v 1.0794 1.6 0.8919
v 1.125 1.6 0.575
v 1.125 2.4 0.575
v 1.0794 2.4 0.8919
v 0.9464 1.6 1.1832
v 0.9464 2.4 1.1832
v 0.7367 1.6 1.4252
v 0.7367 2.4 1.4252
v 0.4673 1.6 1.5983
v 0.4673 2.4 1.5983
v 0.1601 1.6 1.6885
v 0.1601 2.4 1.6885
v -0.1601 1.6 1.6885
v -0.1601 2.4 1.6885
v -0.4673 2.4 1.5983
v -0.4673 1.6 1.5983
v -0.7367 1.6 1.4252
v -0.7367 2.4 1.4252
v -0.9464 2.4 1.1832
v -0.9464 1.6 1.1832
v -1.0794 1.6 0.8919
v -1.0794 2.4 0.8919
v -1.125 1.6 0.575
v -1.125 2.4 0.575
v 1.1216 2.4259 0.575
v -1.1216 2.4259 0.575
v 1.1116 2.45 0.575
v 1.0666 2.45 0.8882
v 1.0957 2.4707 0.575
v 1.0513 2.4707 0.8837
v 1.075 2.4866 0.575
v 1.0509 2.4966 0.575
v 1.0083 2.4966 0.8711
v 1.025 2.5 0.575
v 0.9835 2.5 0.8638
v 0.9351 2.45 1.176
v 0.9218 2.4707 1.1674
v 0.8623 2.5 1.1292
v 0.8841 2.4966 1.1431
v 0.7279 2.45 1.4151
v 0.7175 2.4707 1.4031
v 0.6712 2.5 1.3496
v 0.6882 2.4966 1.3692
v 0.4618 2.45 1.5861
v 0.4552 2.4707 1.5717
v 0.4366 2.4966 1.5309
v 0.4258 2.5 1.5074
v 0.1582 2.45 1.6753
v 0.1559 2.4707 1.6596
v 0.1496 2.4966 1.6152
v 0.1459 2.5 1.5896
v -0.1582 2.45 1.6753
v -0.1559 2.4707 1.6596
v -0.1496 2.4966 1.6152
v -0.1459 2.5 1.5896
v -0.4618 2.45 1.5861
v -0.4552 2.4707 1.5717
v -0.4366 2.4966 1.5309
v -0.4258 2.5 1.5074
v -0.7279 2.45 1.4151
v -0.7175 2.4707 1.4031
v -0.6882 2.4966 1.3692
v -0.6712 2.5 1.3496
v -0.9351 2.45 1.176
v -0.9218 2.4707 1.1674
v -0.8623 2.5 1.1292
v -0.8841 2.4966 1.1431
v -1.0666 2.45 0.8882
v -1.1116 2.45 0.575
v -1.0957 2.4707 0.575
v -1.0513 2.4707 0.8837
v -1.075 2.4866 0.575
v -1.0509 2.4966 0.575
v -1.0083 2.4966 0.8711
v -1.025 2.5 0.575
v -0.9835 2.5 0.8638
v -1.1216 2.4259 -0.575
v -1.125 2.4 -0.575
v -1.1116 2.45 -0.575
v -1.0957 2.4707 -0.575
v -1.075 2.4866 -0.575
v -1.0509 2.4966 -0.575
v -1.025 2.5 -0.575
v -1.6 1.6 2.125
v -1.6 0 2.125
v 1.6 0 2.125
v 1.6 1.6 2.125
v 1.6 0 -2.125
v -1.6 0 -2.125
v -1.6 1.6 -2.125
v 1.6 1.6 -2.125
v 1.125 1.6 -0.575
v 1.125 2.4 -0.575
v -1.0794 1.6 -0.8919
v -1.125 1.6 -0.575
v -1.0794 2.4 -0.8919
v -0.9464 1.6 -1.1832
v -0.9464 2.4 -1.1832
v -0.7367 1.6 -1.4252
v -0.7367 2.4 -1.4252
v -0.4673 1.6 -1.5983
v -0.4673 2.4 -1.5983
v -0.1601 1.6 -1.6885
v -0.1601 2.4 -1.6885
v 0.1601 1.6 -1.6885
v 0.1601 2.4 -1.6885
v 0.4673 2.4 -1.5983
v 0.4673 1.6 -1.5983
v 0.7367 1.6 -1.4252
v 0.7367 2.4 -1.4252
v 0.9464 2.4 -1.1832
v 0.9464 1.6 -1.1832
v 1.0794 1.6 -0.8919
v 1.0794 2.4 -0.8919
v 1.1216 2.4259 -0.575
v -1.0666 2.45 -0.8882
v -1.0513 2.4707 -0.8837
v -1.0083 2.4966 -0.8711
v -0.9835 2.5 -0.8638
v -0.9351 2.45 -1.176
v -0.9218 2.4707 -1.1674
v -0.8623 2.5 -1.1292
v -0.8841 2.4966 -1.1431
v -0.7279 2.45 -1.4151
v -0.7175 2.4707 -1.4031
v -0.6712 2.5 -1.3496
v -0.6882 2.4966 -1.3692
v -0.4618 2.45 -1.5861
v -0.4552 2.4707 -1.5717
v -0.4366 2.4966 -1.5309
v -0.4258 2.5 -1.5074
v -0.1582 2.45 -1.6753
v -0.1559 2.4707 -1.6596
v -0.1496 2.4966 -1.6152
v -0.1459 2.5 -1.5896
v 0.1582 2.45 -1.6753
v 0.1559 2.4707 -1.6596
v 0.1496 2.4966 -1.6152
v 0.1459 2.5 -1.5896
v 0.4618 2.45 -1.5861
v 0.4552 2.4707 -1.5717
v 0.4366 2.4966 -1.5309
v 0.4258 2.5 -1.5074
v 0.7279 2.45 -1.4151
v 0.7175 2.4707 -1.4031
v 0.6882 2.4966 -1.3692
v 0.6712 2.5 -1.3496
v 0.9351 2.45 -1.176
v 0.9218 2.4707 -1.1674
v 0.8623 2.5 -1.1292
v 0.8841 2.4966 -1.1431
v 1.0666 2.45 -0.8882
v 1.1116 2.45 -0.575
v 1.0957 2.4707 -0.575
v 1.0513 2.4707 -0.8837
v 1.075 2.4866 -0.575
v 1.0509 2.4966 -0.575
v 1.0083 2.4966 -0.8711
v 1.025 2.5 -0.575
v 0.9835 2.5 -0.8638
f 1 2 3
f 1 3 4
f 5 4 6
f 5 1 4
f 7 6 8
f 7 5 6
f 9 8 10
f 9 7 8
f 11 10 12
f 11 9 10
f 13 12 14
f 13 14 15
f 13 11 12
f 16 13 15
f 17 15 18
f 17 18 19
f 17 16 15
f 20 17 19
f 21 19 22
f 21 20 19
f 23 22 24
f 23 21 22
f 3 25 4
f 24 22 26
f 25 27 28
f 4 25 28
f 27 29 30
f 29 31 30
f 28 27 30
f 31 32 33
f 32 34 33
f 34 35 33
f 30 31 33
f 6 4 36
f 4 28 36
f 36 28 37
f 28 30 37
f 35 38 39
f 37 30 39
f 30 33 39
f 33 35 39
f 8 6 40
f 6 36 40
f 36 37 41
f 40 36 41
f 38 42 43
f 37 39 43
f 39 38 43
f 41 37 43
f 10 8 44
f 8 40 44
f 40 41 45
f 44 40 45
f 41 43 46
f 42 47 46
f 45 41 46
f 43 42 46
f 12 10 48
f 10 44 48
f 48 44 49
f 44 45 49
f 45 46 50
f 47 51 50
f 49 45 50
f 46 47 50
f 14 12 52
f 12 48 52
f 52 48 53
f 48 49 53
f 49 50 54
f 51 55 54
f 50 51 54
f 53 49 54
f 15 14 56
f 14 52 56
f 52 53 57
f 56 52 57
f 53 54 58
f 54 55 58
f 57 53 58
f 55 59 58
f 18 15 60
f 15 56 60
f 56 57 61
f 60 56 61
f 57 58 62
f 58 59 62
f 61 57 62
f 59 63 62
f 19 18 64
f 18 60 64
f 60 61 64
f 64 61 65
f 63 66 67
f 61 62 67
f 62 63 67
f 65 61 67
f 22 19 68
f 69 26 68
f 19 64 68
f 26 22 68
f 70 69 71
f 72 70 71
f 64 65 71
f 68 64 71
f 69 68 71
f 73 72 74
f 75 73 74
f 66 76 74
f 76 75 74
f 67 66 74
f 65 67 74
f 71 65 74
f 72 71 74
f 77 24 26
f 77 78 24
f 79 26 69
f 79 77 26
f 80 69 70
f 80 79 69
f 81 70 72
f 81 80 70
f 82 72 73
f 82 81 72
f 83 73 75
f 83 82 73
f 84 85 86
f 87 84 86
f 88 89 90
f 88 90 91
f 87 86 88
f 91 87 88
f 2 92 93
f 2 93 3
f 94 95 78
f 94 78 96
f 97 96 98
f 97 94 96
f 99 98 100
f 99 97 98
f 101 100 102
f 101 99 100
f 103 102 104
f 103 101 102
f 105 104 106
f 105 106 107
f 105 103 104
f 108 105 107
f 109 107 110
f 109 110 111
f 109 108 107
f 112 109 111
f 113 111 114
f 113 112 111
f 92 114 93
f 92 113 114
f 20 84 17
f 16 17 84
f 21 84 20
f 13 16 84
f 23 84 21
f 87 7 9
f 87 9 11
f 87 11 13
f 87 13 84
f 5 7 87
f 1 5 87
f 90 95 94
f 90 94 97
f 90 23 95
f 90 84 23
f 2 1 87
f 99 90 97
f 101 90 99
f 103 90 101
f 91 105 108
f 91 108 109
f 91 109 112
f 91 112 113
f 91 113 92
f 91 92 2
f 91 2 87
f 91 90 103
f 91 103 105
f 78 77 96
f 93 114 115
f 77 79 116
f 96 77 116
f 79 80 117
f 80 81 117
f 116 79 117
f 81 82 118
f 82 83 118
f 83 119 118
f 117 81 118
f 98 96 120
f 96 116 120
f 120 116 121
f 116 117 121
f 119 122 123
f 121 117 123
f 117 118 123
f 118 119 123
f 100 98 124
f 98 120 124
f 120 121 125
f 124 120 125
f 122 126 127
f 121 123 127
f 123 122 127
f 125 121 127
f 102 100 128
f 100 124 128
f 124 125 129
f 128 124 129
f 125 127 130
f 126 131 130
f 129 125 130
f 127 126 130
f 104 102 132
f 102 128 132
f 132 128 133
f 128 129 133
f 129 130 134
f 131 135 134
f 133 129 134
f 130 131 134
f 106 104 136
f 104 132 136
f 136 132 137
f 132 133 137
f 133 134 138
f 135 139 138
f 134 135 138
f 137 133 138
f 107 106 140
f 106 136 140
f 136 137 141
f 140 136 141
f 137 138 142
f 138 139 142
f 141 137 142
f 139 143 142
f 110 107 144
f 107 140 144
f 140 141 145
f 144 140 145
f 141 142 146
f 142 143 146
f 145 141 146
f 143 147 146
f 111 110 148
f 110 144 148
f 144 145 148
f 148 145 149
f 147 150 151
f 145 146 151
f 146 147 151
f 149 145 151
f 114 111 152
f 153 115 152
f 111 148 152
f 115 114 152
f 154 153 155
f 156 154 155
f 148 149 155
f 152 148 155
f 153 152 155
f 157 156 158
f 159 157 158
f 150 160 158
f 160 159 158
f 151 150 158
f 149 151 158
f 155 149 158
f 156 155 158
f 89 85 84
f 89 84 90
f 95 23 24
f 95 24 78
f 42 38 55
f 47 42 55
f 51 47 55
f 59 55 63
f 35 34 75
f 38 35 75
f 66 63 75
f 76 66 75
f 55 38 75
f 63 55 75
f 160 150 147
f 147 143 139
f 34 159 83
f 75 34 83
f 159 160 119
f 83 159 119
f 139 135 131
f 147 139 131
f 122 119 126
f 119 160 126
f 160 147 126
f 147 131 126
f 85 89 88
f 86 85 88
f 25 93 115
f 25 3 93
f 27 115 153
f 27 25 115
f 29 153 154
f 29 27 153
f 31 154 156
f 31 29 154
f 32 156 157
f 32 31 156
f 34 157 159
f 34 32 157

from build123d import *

# Parameters (mm, degrees)
BASES_W      = 3.2
BASES_H      = 4.25
BASE_DEPTH   = 1.6
BUTTON_DEPTH = 0.9
BF_R         = 0.1


with BuildPart() as part:
    # BaseS → Base (new body)
    with BuildSketch(Plane(origin=(0, 0, 0), x_dir=(1, 0, 0), z_dir=(0, 1, 0))):
        Rectangle(BASES_W, BASES_H)
    extrude(amount=BASE_DEPTH)

    # ButtonS → Button (add)
    with BuildSketch(Plane(origin=(0, 1.6, 0), x_dir=(1, 0, 0), z_dir=(0, 1, 0))):
        with BuildLine():
            Line((1.125, 0.575), (1.125, -0.575))
            ThreePointArc((1.125, -0.575), (0, -1.7), (-1.125, -0.575))
            Line((-1.125, -0.575), (-1.125, 0.575))
            ThreePointArc((-1.125, 0.575), (0, 1.7), (1.125, 0.575))
        make_face()
    extrude(amount=BUTTON_DEPTH)

    # BF
    bf_edges = [part.edges().sort_by_distance(p)[0] for p in [
        (0, 2.5, -1.7),
        (-1.125, 2.5, 0),
        (0, 2.5, 1.7),
        (1.125, 2.5, 0),
    ]]
    fillet(bf_edges, radius=BF_R)


solid = part.part
